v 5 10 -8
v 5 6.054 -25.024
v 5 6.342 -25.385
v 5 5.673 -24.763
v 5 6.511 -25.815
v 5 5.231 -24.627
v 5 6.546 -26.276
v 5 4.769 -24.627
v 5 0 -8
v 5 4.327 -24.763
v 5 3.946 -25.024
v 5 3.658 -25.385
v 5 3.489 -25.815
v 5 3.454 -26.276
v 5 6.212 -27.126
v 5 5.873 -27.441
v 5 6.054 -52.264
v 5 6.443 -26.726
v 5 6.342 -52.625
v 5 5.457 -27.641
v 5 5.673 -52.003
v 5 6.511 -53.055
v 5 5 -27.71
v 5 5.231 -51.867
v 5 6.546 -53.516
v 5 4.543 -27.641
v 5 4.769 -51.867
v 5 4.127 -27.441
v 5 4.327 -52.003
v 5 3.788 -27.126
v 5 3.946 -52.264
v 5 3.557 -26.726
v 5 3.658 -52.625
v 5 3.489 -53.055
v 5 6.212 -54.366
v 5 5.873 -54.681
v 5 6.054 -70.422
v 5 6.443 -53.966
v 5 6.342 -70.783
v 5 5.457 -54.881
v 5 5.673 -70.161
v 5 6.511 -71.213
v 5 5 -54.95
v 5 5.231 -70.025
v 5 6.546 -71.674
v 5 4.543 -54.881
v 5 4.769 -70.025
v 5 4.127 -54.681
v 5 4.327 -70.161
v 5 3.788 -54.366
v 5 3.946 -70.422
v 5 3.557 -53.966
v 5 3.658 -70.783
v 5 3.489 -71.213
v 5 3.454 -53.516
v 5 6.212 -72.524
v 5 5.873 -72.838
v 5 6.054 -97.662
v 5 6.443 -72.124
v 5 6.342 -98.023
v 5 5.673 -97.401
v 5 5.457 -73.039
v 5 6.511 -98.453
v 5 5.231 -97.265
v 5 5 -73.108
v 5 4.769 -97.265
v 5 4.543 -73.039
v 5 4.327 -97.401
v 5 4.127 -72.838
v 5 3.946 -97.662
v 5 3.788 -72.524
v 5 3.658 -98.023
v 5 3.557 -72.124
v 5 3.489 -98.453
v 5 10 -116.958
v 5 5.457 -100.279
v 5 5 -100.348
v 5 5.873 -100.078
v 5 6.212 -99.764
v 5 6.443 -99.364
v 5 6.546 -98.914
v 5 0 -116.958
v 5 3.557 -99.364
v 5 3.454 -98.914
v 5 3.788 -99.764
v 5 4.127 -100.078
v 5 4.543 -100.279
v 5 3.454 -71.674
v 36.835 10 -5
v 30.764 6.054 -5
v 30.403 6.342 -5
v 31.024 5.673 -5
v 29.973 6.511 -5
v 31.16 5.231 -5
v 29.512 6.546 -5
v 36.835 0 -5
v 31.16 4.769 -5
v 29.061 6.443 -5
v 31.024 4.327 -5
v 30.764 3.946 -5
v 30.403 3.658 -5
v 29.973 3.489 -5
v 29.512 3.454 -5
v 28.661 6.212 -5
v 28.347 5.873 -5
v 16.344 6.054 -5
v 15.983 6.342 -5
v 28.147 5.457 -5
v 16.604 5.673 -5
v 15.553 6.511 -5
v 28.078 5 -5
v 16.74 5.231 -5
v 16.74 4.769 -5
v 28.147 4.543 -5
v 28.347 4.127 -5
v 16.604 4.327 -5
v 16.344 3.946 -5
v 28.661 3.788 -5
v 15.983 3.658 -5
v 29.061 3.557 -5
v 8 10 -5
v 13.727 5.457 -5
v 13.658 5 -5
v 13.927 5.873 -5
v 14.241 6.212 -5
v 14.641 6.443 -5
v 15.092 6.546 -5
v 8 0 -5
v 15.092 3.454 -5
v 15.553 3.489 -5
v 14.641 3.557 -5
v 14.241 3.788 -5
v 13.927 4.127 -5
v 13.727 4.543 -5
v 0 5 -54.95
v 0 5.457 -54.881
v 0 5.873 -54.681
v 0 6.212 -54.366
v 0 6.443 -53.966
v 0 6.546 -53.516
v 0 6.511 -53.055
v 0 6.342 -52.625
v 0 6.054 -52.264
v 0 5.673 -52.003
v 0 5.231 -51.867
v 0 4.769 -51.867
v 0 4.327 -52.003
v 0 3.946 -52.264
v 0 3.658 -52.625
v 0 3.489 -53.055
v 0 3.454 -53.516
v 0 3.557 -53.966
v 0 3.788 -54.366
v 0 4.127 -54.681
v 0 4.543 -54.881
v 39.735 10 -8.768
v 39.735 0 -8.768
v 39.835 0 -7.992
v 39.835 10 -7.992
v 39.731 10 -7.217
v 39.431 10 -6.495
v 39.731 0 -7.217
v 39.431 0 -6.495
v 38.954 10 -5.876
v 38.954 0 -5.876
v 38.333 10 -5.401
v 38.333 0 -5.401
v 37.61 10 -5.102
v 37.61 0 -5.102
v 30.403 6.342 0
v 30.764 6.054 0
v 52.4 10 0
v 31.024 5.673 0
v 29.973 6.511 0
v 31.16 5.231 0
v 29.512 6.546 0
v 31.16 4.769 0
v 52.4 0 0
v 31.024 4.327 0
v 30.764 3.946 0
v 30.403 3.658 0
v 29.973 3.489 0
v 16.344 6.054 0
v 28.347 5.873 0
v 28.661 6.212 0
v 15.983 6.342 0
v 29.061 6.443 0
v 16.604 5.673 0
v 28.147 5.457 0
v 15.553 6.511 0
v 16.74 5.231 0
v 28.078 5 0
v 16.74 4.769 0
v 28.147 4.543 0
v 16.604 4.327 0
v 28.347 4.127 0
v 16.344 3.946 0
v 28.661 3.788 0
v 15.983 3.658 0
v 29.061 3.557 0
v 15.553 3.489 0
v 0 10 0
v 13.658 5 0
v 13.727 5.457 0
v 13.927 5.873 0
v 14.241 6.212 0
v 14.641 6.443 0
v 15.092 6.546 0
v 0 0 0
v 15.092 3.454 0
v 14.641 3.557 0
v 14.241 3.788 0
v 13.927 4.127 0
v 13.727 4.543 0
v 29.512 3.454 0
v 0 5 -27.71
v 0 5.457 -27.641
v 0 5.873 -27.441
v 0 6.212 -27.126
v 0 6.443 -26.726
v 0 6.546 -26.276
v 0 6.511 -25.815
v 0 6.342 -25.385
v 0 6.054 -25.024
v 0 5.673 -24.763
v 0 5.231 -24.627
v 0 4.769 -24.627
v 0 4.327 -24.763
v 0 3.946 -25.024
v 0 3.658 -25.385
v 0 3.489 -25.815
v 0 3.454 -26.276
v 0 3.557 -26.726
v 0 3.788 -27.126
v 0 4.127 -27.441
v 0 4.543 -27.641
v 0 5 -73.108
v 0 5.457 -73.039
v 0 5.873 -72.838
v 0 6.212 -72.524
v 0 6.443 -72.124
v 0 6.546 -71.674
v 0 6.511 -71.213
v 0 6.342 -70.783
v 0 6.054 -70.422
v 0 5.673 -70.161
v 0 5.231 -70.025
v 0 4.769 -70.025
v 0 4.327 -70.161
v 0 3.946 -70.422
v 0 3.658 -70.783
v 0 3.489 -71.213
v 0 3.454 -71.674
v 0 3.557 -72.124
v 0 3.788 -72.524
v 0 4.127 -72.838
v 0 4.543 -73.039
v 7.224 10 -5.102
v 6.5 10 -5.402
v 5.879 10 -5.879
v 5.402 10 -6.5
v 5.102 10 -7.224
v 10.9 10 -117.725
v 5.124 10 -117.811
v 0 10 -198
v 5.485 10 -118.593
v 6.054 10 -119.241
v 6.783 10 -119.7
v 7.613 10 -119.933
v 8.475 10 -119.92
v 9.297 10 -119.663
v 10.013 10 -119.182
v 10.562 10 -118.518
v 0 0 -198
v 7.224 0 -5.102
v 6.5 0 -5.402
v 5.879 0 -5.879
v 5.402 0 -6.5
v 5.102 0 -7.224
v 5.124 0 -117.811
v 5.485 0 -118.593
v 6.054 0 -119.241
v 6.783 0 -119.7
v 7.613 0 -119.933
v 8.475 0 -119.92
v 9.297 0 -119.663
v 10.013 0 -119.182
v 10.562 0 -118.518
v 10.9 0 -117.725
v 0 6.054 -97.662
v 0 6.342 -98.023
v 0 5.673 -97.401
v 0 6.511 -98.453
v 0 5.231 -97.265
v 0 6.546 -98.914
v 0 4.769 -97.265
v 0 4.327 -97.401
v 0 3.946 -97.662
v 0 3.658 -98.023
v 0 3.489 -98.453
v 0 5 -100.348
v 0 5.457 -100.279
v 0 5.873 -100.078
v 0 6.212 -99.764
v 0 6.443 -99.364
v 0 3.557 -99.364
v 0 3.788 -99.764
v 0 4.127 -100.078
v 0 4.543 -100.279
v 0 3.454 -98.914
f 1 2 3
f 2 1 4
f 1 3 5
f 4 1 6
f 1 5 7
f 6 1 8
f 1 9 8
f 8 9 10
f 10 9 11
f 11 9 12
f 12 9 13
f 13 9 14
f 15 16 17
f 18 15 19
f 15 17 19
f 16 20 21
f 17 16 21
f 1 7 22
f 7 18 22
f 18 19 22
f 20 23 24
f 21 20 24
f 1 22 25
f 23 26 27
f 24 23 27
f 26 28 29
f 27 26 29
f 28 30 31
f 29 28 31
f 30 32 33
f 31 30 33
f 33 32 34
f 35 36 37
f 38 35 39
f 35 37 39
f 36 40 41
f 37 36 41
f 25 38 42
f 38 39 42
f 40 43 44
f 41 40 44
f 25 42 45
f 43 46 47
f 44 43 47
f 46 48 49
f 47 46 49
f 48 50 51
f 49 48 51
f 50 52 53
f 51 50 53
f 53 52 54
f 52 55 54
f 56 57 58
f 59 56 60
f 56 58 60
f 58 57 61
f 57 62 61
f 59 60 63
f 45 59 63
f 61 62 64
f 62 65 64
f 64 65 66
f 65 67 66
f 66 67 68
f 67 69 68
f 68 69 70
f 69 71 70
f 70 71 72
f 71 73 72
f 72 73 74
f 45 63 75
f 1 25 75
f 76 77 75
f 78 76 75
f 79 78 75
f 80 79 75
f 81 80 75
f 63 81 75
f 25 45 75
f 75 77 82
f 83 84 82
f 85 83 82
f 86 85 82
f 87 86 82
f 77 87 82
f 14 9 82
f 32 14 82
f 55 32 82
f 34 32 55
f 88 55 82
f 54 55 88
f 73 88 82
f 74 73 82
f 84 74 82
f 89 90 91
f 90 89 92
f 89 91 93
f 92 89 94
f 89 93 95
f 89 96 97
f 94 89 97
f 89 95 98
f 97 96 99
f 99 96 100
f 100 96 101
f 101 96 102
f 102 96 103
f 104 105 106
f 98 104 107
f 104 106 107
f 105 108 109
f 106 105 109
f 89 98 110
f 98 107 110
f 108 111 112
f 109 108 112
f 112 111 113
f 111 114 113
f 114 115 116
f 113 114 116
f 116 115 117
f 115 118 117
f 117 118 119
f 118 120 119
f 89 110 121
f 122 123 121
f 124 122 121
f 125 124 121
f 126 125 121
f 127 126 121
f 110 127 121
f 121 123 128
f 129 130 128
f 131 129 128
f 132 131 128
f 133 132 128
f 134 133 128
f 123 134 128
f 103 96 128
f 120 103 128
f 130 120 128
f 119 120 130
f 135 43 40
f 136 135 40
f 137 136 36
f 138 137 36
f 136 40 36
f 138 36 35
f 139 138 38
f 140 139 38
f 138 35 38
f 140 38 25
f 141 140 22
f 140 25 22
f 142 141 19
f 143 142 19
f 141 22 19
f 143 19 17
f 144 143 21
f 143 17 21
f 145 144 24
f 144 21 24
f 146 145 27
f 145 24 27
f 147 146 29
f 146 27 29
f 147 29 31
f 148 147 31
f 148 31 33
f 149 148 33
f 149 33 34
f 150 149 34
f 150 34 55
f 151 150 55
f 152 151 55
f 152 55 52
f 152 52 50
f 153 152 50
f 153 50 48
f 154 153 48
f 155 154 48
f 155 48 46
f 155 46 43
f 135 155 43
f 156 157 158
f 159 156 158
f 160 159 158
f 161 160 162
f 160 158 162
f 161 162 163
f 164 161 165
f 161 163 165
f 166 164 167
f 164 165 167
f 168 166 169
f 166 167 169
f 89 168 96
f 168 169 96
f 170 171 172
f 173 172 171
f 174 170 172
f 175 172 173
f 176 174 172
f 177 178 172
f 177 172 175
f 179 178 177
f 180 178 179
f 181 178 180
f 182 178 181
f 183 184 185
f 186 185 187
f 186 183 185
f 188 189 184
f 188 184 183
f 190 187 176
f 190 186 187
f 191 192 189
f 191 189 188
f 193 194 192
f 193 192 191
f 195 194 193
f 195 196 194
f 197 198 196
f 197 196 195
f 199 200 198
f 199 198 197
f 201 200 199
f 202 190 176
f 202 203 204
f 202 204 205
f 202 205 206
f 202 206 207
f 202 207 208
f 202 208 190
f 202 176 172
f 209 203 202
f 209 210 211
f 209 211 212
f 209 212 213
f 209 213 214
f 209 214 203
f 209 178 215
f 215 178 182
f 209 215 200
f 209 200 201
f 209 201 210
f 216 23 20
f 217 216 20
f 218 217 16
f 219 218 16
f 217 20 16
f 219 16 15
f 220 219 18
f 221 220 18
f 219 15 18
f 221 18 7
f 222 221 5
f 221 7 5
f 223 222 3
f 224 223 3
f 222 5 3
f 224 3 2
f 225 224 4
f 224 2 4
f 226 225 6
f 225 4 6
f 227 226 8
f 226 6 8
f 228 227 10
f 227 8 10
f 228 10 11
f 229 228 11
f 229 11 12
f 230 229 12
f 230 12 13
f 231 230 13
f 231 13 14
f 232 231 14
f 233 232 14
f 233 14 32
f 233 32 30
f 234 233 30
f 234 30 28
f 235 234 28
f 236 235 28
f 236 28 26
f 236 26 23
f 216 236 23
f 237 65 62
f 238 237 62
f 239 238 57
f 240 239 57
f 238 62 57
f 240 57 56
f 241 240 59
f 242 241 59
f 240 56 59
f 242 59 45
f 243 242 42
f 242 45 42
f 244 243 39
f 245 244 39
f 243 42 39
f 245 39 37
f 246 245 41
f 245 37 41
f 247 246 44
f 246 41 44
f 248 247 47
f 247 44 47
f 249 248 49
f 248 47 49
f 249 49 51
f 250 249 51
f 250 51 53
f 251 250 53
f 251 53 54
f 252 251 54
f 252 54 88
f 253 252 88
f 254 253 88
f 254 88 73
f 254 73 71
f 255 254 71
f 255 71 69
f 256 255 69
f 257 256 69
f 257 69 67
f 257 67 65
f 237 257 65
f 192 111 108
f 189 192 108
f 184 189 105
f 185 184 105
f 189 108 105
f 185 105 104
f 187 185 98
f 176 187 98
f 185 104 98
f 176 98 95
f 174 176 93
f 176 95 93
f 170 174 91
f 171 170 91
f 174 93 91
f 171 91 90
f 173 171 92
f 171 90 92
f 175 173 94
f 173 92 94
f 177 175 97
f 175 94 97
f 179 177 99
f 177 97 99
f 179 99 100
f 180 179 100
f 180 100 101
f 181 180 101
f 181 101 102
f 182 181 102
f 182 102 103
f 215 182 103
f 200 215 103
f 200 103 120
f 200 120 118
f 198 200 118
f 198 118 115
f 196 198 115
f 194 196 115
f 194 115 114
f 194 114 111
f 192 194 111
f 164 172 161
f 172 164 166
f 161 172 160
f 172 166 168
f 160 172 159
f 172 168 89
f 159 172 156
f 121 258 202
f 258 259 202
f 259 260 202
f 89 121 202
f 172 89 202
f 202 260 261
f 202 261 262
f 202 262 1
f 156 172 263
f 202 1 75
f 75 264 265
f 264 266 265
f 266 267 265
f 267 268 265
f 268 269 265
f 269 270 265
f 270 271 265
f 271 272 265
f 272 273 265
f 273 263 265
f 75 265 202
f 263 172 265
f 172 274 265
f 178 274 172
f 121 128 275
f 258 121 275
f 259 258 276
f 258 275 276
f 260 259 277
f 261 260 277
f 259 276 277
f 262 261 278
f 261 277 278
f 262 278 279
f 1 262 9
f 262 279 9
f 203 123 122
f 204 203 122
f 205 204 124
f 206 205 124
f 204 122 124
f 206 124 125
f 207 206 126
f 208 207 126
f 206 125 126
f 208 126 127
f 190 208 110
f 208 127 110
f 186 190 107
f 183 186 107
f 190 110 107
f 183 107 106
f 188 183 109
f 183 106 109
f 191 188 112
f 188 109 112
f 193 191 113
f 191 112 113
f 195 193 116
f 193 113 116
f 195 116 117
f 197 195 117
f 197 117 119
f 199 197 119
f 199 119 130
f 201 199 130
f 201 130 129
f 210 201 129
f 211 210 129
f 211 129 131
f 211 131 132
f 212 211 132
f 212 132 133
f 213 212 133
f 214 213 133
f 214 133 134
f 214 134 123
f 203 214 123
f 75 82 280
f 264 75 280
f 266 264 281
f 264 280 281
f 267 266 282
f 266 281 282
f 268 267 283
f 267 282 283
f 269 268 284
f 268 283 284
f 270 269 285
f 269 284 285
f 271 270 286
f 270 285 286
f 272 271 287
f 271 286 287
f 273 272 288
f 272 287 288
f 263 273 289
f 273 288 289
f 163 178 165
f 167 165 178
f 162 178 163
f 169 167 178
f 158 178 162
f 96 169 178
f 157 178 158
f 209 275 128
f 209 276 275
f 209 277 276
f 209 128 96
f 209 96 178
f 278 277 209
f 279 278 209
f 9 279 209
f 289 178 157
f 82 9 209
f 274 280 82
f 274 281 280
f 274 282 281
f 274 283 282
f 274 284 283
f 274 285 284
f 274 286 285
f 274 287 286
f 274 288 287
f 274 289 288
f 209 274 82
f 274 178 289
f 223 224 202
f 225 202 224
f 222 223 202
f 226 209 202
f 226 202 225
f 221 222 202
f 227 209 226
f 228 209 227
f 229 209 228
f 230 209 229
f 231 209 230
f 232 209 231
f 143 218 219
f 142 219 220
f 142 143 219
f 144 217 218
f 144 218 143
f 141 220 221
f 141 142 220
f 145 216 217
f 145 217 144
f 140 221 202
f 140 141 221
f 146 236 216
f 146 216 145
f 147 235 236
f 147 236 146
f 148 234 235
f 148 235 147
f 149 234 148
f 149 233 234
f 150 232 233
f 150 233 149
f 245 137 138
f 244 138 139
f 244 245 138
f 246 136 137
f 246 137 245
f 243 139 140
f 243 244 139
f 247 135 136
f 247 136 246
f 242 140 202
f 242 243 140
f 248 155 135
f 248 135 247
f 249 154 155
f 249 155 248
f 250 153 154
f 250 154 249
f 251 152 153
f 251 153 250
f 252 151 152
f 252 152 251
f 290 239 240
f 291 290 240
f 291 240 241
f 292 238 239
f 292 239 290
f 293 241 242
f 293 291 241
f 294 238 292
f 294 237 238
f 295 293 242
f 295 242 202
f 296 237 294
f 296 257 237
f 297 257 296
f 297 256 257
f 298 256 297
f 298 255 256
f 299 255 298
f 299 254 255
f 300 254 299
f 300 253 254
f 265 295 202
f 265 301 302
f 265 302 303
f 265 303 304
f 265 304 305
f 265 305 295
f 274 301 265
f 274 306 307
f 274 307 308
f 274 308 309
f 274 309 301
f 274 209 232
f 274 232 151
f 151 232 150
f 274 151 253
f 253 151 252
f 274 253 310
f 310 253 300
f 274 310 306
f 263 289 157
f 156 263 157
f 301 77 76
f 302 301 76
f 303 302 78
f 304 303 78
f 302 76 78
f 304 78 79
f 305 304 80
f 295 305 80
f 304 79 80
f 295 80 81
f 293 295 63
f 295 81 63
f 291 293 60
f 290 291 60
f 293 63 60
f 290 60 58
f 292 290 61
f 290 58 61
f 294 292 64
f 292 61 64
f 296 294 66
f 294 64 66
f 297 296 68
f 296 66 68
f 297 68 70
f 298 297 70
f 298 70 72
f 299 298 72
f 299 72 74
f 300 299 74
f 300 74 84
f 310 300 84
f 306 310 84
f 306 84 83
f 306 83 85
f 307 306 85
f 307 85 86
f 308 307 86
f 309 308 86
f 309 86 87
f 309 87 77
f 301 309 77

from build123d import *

# Parameters (mm, degrees)
BOSS_EXTRUDE1_DEPTH = 10
SKETCH2_R           = 1.55
CUT_EXTRUDE1_DEPTH  = 7
SKETCH3_R           = 1.55
CUT_EXTRUDE2_DEPTH  = 7


with BuildPart() as part:
    # Sketch1 → Boss-Extrude1 (new body)
    with BuildSketch(Plane(origin=(0, 0, 0), x_dir=(1, 0, 0), z_dir=(0, 1, 0))):
        Polygon((0, 0), (0, 198), (52.4, 0), align=None)
        with BuildLine():
            Line((5, 8), (5, 116.957761971))
            ThreePointArc((5, 116.957761971), (7.613008346, 119.932696838), (10.900158307, 117.725278614))
            Line((10.900158307, 117.725278614), (39.735444808, 8.767516643))
            ThreePointArc((39.735444808, 8.767516643), (39.212527542, 6.170047805), (36.835286501, 5))
            Line((36.835286501, 5), (8, 5))
            ThreePointArc((8, 5), (5.878679656, 5.878679656), (5, 8))
        make_face(mode=Mode.SUBTRACT)
    extrude(amount=BOSS_EXTRUDE1_DEPTH)

    # Sketch2 → Cut-Extrude1 (cut)
    with BuildSketch(Plane(origin=(0, 0, -5), x_dir=(-1, 0, 0), z_dir=(0, 0, -1))):
        with Locations((-15.207643251, 5)):
            Circle(SKETCH2_R)
        with Locations((-29.627643251, 5)):
            Circle(SKETCH2_R)
    extrude(amount=-CUT_EXTRUDE1_DEPTH, mode=Mode.SUBTRACT)

    # Sketch3 → Cut-Extrude2 (cut)
    with BuildSketch(Plane(origin=(5, 0, 0), x_dir=(0, 0, -1), z_dir=(1, 0, 0))):
        with Locations((98.797761971, 5)):
            Circle(SKETCH3_R)
        with Locations((71.557761971, 5)):
            Circle(SKETCH3_R)
        with Locations((53.4, 5)):
            Circle(SKETCH3_R)
        with Locations((26.16, 5)):
            Circle(SKETCH3_R)
    extrude(amount=-CUT_EXTRUDE2_DEPTH, mode=Mode.SUBTRACT)


solid = part.part
